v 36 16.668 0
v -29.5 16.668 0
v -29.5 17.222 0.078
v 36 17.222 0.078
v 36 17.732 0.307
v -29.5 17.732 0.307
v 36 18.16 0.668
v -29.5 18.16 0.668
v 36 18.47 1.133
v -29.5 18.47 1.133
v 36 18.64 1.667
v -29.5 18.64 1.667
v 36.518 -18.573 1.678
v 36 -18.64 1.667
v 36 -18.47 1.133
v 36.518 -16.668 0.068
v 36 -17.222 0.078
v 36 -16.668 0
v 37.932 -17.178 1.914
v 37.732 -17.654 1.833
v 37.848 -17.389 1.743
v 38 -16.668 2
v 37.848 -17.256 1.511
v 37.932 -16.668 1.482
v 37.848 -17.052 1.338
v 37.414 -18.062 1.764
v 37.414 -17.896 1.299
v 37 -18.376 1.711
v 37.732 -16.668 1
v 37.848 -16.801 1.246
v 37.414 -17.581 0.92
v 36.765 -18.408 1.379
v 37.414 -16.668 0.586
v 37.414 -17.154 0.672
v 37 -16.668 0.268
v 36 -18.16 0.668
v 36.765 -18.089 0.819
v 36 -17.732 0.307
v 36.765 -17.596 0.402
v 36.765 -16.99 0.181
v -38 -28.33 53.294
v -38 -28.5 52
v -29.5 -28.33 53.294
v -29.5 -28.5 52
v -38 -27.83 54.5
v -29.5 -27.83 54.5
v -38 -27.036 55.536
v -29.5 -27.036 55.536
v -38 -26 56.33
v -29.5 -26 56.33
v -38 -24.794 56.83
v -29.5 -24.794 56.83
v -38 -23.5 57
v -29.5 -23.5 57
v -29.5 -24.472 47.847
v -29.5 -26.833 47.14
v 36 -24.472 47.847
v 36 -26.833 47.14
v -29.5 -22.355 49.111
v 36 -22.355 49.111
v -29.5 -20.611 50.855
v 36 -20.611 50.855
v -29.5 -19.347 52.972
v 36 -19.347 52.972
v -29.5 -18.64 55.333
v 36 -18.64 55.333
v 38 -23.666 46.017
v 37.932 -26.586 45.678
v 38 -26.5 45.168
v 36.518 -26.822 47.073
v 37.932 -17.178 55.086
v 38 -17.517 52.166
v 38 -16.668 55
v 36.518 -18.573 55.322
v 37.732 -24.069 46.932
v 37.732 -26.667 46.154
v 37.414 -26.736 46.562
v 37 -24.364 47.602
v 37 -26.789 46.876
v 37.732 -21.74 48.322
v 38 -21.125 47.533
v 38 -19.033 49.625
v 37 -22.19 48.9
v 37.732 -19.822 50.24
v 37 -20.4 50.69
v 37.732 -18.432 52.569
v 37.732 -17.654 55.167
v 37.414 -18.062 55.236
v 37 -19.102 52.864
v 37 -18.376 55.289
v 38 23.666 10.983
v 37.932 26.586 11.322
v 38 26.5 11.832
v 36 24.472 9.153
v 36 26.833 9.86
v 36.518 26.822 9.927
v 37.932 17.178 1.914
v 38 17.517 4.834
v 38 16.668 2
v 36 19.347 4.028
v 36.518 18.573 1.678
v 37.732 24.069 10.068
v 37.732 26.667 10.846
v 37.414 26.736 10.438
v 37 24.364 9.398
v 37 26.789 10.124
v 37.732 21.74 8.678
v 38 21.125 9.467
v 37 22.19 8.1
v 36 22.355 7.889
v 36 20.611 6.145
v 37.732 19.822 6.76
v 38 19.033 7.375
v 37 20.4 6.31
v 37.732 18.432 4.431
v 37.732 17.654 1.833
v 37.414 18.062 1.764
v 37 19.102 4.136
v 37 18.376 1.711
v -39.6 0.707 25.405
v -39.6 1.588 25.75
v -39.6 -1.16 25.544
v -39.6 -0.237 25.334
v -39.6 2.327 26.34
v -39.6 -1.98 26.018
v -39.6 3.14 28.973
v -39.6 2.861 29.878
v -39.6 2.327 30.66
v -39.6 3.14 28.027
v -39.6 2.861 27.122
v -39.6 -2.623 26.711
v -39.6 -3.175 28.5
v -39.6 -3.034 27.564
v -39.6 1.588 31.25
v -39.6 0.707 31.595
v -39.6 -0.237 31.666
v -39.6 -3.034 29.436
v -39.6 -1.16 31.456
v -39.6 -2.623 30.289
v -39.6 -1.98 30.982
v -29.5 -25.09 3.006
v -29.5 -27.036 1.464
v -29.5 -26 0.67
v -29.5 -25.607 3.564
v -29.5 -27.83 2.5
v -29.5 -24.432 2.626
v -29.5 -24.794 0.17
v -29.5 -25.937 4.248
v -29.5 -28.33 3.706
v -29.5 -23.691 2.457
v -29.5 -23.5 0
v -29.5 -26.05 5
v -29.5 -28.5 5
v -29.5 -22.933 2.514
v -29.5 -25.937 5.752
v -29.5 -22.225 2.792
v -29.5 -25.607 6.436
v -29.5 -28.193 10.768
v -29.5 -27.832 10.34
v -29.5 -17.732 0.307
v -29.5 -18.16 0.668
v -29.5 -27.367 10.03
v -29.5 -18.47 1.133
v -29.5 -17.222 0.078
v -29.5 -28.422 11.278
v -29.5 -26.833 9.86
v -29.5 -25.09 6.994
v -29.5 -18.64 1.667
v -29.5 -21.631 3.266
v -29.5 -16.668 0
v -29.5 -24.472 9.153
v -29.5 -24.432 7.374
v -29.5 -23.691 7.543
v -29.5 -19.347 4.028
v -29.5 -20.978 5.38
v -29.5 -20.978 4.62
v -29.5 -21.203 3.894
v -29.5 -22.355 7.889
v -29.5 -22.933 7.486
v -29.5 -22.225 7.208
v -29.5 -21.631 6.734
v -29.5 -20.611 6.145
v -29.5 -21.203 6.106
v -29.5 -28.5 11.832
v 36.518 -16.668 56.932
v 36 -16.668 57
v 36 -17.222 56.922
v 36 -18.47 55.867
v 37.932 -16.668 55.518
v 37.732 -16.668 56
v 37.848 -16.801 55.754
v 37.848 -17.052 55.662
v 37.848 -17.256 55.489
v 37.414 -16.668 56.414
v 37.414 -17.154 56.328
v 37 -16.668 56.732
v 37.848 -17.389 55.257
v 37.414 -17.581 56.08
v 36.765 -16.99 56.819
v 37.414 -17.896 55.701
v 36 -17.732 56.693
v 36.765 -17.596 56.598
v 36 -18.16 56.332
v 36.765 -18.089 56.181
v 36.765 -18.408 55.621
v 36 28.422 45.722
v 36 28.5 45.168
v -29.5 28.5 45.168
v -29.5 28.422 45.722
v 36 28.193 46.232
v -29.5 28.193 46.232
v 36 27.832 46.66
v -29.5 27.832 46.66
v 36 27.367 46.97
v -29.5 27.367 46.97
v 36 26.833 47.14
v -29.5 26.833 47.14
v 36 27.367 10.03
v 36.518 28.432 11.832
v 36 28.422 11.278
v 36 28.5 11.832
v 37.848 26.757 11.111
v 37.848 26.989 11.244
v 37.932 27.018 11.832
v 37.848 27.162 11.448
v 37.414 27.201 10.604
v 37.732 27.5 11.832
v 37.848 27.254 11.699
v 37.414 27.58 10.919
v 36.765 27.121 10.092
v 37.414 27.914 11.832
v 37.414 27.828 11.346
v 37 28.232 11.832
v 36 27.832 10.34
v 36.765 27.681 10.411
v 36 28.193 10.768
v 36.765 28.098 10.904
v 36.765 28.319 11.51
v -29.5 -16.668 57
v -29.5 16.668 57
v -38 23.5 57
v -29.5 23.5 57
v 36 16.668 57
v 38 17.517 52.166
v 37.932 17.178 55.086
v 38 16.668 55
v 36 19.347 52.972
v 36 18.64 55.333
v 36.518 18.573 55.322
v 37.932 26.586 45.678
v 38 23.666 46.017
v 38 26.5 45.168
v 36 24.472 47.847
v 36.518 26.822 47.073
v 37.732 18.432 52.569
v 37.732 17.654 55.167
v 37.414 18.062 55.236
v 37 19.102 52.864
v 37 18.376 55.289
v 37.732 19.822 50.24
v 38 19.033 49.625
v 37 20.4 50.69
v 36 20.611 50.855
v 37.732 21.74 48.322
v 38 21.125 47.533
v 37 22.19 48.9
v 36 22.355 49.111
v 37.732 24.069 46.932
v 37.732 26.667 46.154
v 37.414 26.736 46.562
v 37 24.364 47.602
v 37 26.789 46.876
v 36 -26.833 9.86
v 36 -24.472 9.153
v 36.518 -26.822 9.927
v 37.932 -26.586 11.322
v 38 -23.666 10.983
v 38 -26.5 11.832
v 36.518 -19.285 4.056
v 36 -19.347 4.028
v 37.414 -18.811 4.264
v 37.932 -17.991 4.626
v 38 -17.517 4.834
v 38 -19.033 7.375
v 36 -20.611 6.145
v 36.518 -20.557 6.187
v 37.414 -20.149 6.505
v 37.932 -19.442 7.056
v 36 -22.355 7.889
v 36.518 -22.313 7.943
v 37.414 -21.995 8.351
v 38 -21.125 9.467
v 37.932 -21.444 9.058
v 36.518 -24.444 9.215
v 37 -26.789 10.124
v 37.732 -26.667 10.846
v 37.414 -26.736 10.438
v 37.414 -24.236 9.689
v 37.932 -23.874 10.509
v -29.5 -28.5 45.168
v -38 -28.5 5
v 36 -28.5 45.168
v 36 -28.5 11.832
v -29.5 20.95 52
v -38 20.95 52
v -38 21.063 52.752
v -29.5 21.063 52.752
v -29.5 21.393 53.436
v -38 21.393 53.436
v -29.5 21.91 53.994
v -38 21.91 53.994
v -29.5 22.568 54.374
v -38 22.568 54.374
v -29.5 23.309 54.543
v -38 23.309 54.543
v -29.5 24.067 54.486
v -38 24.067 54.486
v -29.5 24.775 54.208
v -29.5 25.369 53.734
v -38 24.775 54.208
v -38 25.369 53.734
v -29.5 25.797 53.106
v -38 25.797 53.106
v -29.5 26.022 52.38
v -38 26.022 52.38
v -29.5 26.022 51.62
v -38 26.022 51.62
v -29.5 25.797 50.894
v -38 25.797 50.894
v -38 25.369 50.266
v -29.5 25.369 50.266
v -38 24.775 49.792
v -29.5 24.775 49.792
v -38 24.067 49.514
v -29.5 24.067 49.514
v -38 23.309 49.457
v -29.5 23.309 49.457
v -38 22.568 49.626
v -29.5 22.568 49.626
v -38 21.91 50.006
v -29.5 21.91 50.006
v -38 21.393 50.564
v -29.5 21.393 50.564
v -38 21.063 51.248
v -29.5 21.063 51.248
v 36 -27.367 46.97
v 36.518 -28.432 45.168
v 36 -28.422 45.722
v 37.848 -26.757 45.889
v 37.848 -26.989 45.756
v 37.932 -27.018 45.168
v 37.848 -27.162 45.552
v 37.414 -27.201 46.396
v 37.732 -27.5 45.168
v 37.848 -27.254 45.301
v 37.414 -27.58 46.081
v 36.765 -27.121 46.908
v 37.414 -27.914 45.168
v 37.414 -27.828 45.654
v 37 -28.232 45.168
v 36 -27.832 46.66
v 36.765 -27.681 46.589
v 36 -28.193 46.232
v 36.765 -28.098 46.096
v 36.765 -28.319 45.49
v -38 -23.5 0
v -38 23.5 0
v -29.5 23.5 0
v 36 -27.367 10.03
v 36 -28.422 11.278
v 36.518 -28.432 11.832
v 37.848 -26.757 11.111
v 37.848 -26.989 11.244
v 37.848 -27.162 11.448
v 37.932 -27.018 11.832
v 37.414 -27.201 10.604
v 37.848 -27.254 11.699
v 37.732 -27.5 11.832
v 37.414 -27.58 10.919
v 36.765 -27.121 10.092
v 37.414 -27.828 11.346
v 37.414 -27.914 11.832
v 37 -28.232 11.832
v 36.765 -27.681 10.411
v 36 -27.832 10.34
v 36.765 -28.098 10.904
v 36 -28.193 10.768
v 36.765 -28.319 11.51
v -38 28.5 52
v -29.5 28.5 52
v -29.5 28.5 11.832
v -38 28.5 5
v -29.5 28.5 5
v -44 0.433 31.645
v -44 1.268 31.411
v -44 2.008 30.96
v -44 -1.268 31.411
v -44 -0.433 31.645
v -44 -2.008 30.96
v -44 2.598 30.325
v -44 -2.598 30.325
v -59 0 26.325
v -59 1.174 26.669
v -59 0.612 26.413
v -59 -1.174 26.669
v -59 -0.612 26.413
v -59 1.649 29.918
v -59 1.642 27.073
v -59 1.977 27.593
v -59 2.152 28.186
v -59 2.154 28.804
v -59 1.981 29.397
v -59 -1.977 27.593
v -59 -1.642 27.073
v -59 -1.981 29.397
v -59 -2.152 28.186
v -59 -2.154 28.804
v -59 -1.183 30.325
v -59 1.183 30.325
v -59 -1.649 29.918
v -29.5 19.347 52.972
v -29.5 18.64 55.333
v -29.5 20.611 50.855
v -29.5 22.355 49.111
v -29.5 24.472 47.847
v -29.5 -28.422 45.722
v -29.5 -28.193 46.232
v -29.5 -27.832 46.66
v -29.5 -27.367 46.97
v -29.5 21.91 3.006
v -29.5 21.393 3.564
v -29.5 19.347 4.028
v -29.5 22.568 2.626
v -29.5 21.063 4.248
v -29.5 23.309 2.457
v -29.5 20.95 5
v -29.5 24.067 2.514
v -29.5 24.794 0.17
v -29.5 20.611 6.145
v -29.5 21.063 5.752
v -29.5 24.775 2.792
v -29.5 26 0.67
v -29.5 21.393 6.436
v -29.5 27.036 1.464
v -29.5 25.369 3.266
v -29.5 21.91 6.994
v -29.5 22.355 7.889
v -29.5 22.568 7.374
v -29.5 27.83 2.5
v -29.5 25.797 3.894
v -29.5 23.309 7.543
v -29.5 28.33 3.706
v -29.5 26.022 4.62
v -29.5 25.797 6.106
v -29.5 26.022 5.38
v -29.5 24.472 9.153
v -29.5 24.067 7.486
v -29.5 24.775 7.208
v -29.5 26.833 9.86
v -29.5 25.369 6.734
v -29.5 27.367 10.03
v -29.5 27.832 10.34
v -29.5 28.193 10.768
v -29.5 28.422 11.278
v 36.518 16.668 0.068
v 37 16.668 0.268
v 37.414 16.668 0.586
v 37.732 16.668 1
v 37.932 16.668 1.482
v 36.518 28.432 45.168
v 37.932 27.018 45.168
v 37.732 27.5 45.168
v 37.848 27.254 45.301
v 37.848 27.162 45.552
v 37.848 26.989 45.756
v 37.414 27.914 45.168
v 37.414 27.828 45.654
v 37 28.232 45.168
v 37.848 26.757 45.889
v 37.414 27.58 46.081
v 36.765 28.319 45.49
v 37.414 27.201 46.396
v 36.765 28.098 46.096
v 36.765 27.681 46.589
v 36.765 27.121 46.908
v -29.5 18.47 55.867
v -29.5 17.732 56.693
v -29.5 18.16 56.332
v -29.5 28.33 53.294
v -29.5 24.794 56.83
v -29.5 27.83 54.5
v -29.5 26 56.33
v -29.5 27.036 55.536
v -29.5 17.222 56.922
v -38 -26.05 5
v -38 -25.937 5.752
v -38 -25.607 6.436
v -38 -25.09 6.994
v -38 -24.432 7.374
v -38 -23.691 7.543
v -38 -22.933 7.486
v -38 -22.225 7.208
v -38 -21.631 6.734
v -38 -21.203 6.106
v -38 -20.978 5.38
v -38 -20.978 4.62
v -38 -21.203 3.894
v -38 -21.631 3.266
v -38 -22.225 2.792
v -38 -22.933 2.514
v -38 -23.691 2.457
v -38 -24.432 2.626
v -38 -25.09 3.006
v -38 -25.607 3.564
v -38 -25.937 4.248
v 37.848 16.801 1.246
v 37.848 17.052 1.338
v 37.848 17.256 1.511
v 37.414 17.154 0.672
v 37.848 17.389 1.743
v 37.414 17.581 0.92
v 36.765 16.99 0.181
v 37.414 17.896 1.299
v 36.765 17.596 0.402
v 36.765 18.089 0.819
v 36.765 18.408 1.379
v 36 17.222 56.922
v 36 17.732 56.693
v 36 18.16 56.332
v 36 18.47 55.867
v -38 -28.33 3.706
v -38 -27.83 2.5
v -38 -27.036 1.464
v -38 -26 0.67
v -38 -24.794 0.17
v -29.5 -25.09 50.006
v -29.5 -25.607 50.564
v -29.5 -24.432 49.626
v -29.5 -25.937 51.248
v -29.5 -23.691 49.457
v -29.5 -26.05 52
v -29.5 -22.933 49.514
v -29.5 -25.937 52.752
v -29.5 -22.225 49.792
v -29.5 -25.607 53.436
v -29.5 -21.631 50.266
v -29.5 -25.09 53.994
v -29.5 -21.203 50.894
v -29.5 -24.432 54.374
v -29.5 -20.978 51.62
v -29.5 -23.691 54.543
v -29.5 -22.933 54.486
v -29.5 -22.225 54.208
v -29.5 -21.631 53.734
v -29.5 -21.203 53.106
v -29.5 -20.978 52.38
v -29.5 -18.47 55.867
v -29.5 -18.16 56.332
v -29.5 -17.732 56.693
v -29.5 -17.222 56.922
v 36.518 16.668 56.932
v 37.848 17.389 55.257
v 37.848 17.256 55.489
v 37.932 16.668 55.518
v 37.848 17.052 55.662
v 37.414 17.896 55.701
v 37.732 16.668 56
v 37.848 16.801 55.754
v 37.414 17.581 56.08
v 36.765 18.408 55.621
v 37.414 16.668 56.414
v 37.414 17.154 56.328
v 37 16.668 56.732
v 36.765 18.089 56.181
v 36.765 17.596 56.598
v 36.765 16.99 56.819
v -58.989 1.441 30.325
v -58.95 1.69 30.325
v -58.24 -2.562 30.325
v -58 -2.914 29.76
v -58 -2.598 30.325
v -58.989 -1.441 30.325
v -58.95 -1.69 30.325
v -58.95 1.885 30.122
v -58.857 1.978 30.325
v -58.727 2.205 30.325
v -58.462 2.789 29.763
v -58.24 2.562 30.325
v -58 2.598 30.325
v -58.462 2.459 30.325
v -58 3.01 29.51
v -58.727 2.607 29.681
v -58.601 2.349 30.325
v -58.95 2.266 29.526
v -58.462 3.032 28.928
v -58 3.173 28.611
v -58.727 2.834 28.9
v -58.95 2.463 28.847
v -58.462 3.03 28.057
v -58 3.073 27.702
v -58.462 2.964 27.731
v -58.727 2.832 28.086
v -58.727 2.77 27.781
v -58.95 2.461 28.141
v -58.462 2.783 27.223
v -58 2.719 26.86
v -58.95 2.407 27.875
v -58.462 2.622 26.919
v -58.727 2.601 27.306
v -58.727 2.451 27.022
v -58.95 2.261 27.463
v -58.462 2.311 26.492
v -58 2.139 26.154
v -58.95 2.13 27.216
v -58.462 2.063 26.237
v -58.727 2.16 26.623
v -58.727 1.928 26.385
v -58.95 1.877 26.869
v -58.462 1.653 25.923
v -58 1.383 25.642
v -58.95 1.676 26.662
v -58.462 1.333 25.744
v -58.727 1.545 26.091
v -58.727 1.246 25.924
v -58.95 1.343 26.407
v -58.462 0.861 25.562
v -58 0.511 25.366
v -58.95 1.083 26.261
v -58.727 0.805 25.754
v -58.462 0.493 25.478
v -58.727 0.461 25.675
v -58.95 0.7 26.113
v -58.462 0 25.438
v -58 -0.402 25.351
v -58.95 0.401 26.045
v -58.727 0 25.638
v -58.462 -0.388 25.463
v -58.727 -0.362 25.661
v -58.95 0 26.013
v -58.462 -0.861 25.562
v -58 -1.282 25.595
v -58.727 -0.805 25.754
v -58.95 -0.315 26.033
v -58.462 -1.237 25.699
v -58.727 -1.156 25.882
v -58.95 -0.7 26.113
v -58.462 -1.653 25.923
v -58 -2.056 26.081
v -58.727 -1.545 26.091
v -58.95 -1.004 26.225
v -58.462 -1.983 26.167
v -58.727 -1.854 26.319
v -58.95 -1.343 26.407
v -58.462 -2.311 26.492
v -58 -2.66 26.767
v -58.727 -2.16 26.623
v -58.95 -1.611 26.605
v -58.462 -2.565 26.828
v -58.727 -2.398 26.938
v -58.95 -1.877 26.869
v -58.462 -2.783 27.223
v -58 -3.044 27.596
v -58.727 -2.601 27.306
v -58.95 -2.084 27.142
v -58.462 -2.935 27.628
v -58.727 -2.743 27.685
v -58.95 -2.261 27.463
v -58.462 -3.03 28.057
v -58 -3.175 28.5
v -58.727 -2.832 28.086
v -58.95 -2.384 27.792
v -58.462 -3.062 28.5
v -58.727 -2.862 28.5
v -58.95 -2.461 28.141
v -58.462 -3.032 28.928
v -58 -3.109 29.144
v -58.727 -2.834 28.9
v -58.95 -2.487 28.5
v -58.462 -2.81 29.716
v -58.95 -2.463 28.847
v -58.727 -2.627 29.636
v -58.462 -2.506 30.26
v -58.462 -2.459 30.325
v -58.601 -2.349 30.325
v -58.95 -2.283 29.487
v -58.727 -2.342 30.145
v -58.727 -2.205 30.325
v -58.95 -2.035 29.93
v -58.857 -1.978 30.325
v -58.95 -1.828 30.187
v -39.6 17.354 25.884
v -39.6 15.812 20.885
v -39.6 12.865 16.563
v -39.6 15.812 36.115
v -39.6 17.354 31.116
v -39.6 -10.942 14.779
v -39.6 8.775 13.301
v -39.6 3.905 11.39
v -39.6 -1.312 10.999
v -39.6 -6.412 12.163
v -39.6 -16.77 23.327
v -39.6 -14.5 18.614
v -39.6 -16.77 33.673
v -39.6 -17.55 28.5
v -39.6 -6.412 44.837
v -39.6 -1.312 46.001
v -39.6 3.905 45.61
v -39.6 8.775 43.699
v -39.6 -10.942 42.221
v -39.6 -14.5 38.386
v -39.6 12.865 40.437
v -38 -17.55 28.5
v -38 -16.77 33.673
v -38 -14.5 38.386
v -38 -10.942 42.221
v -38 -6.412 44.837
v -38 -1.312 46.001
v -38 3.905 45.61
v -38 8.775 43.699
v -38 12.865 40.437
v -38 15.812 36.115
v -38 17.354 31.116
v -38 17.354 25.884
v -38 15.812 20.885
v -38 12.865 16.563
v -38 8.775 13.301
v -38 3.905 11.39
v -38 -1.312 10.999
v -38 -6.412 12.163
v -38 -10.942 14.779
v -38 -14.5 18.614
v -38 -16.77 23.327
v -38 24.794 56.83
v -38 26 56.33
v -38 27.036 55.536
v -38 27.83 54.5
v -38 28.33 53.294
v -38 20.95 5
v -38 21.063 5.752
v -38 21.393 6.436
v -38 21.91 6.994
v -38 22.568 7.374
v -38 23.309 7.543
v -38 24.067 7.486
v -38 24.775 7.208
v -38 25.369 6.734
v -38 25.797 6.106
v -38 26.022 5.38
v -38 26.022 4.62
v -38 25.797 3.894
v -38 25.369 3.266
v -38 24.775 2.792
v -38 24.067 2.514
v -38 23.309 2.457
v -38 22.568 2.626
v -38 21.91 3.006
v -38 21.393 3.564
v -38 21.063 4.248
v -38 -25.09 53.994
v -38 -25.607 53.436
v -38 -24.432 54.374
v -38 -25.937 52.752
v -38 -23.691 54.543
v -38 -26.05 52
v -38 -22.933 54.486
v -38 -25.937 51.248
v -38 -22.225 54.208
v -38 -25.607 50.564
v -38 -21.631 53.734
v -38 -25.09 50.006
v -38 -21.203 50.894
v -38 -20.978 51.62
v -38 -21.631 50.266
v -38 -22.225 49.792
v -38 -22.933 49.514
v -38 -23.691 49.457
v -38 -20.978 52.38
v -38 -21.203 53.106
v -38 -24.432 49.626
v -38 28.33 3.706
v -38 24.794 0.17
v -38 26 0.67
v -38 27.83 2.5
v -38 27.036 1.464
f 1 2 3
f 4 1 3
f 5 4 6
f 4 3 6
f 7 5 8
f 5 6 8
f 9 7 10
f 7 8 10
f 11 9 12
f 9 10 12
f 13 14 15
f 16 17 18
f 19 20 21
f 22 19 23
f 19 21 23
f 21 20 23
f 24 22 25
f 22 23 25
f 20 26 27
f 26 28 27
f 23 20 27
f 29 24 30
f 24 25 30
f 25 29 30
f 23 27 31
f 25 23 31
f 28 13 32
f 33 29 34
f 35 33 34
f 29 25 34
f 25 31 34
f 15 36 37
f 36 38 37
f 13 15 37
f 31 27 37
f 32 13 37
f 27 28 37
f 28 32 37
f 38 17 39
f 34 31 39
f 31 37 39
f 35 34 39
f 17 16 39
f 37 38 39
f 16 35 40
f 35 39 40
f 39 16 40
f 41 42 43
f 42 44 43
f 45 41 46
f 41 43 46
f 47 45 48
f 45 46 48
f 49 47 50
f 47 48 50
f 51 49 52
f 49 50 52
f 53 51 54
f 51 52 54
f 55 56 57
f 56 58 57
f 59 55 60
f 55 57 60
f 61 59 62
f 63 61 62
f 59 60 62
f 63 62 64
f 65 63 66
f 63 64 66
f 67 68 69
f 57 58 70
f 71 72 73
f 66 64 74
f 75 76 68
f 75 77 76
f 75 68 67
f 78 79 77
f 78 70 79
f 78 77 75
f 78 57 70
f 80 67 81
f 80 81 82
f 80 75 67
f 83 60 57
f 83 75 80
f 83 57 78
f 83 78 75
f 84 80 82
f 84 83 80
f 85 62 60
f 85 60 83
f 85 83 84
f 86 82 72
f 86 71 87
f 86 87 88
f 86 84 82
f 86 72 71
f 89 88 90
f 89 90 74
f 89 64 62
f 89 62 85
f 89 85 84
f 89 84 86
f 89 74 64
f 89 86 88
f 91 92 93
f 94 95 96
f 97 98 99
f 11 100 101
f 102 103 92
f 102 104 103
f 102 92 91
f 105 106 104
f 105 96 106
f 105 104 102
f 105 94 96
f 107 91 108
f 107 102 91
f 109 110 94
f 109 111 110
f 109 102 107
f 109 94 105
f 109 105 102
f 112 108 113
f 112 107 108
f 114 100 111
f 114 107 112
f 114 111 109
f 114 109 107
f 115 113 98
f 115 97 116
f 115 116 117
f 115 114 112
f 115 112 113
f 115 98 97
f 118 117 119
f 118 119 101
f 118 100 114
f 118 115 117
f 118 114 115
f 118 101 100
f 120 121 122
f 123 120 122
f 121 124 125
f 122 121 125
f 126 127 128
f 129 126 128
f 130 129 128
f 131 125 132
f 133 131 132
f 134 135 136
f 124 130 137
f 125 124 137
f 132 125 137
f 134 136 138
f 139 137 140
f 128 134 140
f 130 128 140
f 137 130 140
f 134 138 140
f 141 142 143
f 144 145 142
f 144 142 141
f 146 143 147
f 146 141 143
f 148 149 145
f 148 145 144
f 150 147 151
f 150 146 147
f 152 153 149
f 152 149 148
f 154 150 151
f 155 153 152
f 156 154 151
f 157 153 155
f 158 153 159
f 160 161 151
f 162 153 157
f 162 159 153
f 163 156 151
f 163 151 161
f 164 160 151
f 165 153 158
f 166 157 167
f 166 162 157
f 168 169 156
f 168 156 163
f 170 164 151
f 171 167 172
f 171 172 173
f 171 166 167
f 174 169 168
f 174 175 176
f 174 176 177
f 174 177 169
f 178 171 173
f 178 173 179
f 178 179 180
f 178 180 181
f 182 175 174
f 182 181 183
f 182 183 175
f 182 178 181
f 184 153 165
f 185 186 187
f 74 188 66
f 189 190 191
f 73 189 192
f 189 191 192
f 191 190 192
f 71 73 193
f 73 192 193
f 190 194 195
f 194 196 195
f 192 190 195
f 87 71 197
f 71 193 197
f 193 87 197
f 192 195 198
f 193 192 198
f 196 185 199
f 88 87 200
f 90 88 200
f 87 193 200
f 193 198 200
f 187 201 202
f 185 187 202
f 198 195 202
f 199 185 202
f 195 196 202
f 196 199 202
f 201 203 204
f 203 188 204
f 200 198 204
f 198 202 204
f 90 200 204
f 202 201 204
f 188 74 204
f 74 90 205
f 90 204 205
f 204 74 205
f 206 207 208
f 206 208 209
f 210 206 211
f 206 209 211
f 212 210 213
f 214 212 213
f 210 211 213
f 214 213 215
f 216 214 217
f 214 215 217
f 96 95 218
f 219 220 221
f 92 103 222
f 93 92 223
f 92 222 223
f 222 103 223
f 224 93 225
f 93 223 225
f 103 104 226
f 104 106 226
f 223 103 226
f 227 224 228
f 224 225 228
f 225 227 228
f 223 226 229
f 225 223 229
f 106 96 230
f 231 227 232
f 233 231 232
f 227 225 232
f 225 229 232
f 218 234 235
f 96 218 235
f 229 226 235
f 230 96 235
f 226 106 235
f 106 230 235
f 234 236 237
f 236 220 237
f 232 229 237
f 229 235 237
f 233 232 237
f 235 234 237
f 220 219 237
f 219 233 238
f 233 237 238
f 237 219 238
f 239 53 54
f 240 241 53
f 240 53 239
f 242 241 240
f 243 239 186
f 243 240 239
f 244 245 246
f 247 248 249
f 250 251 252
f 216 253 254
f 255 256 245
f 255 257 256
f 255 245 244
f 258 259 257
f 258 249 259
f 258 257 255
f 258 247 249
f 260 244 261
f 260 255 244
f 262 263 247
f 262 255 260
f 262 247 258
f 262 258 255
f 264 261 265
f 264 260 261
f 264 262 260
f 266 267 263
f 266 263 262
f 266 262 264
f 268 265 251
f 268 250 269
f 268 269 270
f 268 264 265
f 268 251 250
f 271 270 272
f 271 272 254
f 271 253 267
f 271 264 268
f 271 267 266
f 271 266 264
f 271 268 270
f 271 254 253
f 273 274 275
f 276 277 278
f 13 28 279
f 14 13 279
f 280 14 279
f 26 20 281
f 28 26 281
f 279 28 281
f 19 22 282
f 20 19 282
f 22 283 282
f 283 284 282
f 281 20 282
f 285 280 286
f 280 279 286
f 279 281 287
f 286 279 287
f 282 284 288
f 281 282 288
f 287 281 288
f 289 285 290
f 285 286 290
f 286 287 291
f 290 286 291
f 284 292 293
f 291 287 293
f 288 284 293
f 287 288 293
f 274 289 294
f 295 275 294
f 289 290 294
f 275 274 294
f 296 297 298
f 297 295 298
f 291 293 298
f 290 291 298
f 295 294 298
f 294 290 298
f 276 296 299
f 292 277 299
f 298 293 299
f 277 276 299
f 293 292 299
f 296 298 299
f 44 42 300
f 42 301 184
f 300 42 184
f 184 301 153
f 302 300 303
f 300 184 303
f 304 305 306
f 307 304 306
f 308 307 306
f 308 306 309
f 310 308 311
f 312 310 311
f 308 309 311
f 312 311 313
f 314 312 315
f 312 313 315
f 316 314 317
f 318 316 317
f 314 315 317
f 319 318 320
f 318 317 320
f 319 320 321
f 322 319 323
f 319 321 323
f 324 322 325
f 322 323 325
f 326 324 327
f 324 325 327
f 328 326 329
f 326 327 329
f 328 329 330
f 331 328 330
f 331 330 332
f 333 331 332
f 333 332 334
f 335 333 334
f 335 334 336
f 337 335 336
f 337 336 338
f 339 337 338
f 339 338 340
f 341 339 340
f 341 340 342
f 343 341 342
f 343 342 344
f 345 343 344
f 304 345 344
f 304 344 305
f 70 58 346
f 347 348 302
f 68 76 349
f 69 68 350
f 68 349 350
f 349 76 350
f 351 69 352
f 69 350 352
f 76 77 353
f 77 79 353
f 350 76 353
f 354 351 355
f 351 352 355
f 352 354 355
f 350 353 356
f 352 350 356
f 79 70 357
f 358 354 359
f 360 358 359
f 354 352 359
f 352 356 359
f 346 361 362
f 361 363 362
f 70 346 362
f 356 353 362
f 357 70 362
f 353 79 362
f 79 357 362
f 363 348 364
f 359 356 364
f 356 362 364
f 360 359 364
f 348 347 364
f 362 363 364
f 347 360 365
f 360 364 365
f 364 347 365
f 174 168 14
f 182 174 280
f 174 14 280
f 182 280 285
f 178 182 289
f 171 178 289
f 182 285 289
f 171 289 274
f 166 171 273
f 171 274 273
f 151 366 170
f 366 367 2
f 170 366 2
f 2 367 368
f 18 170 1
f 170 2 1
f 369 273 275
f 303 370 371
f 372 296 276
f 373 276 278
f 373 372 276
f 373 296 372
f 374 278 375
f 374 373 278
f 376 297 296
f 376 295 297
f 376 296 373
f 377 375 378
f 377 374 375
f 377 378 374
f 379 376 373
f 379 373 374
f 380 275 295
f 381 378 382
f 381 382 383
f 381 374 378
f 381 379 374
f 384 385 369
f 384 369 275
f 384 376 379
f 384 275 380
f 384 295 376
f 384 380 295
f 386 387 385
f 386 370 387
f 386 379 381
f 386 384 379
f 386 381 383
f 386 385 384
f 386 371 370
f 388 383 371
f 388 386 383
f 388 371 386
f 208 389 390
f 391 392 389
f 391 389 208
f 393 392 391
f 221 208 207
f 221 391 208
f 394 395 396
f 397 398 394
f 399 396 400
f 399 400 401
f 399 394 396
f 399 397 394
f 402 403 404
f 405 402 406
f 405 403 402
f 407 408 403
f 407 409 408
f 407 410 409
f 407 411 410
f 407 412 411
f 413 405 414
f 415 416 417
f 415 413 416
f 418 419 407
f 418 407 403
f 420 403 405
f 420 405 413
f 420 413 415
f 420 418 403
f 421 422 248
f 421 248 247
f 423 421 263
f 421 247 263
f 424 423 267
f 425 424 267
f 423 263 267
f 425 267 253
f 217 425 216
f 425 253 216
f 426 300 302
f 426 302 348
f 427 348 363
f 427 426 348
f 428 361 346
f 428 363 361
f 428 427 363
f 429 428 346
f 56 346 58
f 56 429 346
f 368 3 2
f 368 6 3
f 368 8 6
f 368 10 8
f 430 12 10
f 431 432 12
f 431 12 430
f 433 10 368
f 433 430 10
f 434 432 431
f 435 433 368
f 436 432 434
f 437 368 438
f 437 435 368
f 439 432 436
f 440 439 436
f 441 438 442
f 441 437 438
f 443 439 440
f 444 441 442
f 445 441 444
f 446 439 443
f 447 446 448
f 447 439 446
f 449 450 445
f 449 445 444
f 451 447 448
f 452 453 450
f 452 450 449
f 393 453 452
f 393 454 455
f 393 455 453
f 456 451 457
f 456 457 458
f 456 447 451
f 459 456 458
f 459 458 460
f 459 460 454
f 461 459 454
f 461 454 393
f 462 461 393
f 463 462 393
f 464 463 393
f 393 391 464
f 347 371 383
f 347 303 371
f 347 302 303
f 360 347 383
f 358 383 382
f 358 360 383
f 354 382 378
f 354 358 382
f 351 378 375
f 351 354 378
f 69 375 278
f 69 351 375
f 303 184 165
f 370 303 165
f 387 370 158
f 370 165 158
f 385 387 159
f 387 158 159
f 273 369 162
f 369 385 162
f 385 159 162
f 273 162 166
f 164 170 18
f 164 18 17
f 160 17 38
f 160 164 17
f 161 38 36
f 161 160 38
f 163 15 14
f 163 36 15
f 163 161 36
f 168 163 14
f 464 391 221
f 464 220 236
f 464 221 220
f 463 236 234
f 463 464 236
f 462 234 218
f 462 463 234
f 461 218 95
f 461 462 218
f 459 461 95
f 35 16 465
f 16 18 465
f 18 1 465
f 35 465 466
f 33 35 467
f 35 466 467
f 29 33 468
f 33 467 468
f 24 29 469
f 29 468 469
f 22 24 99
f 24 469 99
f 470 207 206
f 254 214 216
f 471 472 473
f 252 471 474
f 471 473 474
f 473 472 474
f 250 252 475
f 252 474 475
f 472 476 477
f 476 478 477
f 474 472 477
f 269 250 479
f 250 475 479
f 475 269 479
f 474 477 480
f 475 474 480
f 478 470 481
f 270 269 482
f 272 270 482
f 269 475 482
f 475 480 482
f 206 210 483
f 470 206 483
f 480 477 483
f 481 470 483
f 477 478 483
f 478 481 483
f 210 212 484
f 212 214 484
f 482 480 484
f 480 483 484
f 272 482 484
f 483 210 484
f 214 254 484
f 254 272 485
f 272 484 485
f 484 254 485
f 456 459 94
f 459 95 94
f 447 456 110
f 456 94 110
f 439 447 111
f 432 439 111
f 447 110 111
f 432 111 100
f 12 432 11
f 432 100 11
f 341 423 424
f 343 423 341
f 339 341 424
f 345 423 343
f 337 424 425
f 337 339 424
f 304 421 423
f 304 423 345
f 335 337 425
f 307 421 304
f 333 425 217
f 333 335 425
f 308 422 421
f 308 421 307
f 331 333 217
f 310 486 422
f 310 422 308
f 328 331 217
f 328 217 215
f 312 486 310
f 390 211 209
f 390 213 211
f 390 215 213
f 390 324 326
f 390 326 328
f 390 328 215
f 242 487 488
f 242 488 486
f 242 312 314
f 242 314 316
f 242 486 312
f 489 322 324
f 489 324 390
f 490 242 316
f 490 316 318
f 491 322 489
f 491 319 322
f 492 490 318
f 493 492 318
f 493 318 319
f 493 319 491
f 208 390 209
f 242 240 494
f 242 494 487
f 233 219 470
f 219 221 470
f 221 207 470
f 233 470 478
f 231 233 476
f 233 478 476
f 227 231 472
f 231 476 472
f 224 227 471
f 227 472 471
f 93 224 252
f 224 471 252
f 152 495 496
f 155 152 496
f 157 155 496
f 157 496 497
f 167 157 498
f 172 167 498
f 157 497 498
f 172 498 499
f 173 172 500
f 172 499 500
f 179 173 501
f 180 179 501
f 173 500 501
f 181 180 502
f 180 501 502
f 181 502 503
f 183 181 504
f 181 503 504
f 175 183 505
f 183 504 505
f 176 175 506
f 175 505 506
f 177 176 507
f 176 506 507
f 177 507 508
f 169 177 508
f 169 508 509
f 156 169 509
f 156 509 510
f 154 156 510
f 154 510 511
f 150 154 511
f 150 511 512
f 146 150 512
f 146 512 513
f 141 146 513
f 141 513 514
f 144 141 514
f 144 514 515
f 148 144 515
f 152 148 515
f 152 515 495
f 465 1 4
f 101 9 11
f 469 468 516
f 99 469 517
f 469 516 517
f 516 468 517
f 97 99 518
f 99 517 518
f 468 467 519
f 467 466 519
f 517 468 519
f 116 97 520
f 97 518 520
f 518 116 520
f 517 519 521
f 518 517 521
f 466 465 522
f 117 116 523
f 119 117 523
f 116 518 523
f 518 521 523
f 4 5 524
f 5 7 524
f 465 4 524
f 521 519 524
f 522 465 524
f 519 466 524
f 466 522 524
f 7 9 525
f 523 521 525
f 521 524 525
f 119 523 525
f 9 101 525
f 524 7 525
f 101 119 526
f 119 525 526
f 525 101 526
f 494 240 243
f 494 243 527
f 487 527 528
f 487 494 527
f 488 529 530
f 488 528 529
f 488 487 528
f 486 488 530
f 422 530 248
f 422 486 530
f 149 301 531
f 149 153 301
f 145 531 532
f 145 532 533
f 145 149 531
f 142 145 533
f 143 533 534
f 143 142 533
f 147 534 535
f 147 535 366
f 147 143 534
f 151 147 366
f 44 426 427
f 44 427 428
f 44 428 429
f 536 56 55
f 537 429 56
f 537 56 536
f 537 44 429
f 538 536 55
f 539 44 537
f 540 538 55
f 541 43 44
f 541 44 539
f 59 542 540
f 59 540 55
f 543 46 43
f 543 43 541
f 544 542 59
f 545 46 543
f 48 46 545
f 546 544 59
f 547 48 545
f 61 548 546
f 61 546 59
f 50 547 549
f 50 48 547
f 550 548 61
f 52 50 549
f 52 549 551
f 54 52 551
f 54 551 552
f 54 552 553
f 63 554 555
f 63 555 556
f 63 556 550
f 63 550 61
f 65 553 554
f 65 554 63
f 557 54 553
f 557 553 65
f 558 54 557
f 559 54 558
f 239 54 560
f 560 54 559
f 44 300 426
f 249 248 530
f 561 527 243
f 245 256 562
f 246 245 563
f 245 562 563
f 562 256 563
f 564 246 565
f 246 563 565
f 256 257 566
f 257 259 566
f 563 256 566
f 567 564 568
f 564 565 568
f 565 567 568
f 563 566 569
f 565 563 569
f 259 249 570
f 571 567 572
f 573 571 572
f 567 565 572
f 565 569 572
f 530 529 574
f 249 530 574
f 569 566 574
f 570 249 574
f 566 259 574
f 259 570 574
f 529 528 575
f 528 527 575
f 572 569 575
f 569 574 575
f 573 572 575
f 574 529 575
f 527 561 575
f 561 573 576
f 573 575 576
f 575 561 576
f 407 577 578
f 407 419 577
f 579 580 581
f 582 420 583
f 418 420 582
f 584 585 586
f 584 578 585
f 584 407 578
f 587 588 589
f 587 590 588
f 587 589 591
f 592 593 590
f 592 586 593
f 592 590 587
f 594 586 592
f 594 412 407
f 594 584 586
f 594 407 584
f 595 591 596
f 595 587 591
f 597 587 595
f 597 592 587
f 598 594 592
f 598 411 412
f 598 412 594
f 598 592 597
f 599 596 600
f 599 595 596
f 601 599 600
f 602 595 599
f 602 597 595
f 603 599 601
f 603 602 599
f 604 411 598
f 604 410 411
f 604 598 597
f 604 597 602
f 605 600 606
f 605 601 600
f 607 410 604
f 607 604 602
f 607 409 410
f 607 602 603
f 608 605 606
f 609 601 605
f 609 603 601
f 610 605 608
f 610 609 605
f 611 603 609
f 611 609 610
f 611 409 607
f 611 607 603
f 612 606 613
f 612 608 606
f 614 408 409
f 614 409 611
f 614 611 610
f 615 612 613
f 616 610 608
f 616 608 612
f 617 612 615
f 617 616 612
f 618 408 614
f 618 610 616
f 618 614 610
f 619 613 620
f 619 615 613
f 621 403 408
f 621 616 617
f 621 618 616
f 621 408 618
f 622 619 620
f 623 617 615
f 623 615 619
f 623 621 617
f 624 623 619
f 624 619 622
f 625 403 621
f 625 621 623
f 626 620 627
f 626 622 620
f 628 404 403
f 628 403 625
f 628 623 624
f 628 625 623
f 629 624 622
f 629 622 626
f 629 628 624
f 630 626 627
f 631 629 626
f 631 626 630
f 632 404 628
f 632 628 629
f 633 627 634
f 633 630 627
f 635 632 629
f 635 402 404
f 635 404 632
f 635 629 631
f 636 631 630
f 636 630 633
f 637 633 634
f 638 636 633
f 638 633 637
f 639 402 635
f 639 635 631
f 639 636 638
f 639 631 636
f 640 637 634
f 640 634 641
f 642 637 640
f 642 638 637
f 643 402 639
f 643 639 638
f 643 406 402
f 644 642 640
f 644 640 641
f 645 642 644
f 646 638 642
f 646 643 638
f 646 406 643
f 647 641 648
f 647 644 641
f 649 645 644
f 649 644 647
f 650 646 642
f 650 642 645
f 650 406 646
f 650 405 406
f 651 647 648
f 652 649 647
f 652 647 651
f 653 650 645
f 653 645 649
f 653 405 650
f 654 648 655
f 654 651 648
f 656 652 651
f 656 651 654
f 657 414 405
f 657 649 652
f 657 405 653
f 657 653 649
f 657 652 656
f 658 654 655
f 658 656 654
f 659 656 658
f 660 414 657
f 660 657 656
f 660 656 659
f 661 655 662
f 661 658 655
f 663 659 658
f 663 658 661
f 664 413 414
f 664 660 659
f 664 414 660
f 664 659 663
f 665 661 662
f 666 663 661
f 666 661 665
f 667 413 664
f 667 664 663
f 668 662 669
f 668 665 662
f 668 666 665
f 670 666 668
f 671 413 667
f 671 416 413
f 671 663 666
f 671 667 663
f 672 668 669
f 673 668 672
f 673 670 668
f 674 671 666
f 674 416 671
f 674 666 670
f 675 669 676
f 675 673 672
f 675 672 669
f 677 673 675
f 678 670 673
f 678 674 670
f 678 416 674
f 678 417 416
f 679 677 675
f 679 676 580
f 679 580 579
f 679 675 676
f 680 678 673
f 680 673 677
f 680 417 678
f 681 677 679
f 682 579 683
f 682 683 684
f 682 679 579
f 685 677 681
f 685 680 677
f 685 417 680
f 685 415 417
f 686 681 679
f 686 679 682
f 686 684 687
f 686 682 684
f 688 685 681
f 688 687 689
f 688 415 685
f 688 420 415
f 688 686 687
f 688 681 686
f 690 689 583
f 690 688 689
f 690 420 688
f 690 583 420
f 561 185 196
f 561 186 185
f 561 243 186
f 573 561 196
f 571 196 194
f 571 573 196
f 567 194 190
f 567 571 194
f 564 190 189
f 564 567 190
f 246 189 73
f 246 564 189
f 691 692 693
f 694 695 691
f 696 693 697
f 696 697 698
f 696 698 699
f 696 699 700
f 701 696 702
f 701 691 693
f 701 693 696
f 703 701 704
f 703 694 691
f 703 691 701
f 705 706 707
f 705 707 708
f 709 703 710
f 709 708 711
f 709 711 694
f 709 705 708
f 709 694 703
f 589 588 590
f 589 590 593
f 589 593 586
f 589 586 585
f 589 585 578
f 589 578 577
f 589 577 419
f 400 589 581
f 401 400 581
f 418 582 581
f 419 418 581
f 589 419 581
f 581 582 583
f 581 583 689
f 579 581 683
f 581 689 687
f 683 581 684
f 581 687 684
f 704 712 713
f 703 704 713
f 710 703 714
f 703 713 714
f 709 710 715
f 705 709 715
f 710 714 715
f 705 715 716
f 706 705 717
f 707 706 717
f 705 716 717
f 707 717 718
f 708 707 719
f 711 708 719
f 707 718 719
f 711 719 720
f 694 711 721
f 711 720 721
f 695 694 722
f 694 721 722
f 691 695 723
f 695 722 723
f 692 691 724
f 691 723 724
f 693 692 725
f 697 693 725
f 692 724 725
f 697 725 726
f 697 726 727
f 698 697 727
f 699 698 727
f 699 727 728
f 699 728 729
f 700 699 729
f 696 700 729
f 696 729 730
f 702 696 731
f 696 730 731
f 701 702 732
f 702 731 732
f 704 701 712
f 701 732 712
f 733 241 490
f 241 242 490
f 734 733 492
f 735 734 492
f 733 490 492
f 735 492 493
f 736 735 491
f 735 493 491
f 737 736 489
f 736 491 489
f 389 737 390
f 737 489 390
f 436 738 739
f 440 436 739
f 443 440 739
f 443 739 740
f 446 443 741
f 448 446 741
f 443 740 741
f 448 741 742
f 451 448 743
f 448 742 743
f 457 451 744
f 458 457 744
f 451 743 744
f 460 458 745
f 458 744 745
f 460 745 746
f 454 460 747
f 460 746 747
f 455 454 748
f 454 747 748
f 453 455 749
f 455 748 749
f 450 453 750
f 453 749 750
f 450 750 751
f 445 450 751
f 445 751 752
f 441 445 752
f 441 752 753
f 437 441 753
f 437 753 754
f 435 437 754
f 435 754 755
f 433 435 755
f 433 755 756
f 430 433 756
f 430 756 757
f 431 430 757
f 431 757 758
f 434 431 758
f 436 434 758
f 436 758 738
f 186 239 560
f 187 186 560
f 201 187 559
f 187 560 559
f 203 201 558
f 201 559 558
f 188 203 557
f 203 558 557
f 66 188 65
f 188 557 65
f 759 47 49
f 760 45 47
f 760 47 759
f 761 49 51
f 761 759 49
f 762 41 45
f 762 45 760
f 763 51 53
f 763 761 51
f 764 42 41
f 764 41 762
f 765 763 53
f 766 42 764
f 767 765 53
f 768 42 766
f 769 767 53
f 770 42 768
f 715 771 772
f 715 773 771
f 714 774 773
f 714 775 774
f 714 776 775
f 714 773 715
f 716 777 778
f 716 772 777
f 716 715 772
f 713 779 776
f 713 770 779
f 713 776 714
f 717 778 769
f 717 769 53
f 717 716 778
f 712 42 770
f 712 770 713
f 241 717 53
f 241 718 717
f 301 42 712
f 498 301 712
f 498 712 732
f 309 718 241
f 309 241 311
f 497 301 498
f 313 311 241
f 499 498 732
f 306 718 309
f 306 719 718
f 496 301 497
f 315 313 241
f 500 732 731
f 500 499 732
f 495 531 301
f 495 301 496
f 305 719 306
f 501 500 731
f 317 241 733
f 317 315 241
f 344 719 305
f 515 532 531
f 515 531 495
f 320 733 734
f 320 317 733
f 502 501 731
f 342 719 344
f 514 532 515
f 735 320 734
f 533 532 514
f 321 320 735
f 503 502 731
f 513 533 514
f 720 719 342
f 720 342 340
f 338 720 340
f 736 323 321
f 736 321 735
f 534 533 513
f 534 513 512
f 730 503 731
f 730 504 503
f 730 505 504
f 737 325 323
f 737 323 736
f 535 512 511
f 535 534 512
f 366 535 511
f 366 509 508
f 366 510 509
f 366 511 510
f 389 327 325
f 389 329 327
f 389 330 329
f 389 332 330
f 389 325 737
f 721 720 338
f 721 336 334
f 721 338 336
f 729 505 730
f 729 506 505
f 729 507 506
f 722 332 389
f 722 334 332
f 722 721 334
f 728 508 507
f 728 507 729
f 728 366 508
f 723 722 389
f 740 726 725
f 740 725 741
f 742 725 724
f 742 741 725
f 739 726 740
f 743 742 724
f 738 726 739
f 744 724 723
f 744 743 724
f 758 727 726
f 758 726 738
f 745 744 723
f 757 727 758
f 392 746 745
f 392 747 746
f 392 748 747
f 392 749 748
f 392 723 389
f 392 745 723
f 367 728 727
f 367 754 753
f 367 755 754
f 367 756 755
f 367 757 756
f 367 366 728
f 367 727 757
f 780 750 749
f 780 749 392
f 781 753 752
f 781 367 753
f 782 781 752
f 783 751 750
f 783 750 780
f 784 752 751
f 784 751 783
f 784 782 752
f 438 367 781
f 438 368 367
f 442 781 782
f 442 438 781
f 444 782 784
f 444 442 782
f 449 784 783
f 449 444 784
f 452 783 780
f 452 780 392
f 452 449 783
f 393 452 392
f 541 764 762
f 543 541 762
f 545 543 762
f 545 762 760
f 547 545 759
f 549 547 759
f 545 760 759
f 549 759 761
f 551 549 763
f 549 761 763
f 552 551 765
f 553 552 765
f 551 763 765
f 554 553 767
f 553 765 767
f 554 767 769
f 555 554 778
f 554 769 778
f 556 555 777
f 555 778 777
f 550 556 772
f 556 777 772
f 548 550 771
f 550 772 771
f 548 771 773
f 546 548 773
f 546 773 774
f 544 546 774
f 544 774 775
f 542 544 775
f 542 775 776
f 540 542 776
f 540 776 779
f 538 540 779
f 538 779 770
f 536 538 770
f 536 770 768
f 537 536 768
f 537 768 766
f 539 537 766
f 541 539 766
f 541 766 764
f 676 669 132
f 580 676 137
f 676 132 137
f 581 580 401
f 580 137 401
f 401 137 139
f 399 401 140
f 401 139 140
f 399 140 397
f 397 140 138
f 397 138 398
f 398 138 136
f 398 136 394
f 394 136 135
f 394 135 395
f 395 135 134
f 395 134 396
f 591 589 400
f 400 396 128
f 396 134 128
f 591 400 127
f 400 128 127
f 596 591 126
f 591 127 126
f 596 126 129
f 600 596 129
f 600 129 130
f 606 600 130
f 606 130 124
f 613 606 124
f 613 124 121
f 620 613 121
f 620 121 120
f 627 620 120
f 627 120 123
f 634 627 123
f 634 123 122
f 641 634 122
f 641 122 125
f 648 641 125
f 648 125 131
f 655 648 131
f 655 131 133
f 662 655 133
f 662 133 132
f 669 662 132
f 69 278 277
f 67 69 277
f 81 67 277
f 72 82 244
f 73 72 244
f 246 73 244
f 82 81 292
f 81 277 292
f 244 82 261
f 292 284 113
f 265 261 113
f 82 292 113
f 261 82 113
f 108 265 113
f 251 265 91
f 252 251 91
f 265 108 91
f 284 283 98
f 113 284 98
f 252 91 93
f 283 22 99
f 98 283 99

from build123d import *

# Parameters (mm, degrees)
F0_W      = 76
F0_H      = 57
F1_DEPTH  = 57
F2_R      = 17.55
F3_DEPTH  = 1.6
F4_R      = 2.55
F5_DEPTH  = 25
F7_DEPTH  = 67.5
F8_R      = 5
F9_R      = 2
F10_R     = 3.175
F11_DEPTH = 19.4
F13_DEPTH = 15
F14_R     = 1


with BuildPart() as f1:
    # F0 (on Top) → F1 (new body)
    with BuildSketch(Plane.XY):
        Rectangle(F0_W, F0_H)
    extrude(amount=F1_DEPTH)

    # F2 (on face) → F3 (join)
    with BuildSketch(Plane(origin=(-38, 0, 0), x_dir=(0, -1, 0), z_dir=(-1, 0, 0))):
        with Locations((0, 28.5)):
            Circle(F2_R)
    extrude(amount=F3_DEPTH)

    # F4 (on face) → F5 (cut)
    with BuildSketch(Plane(origin=(-38, 0, 0), x_dir=(0, -1, 0), z_dir=(-1, 0, 0))):
        with Locations((-23.5, 52)):
            Circle(F4_R)
        with Locations((23.5, 52)):
            Circle(F4_R)
        with Locations((23.5, 5)):
            Circle(F4_R)
        with Locations((-23.5, 5)):
            Circle(F4_R)
    extrude(amount=-F5_DEPTH, mode=Mode.SUBTRACT)

    # F6 (on face) → F7 (cut)
    with BuildSketch(Plane.YZ.offset(38)):
        with BuildLine():
            Line((-28.5, 57), (-28.5, 47))
            ThreePointArc((-28.5, 47), (-21.4289321881, 49.9289321881), (-18.5, 57))
            Line((-18.5, 57), (-28.5, 57))
        make_face()
        with BuildLine():
            Line((-28.5, 0), (-18.5, 0))
            ThreePointArc((-18.5, 0), (-21.4289321881, 7.0710678119), (-28.5, 10))
            Line((-28.5, 10), (-28.5, 0))
        make_face()
        with BuildLine():
            Line((28.5, 0), (28.5, 10))
            ThreePointArc((28.5, 10), (21.4289321881, 7.0710678119), (18.5, 0))
            Line((18.5, 0), (28.5, 0))
        make_face()
        with BuildLine():
            Line((28.5, 57), (18.5, 57))
            ThreePointArc((18.5, 57), (21.4289321881, 49.9289321881), (28.5, 47))
            Line((28.5, 47), (28.5, 57))
        make_face()
    extrude(amount=-F7_DEPTH, mode=Mode.SUBTRACT)

    # F8
    f8_edges = [f1.edges().sort_by_distance(p)[0] for p in [
        (-33.75, -28.5, 57),
        (-33.75, 28.5, 57),
        (-33.75, 28.5, 0),
        (-33.75, -28.5, 0),
    ]]
    fillet(f8_edges, radius=F8_R)

    # F9
    f9_edges = [f1.edges().sort_by_distance(p)[0] for p in [
        (4.25, -18.5, 57),
        (4.25, -28.5, 47),
        (4.25, -28.5, 10),
        (4.25, -18.5, 0),
        (4.25, 18.5, 57),
        (4.25, 28.5, 47),
        (4.25, 28.5, 10),
        (4.25, 18.5, 0),
        (38, -21.428932, 7.071068),
        (38, 0, 0),
        (38, 21.428932, 7.071068),
        (38, 28.5, 28.5),
        (38, 21.428932, 49.928932),
        (38, 0, 57),
        (38, -21.428932, 49.928932),
        (38, -28.5, 28.5),
    ]]
    fillet(f9_edges, radius=F9_R)


with BuildPart() as f11:
    # F10 (on face) → F11 (new body)
    with BuildSketch(Plane(origin=(-39.6, 0, 0), x_dir=(0, -1, 0), z_dir=(-1, 0, 0))):
        with Locations((0, 28.5)):
            Circle(F10_R)
    extrude(amount=F11_DEPTH)

    # F12 (on face) → F13 (cut)
    with BuildSketch(Plane(origin=(-59, 0, 0), x_dir=(0, -1, 0), z_dir=(-1, 0, 0))):
        with BuildLine():
            ThreePointArc((2.5980762114, 30.325), (0, 31.675), (-2.5980762114, 30.325))
            Line((-2.5980762114, 30.325), (2.5980762114, 30.325))
        make_face()
    extrude(amount=-F13_DEPTH, mode=Mode.SUBTRACT)

    # F14
    f14_edges = [f11.edges().sort_by_distance(p)[0] for p in [
        (-59, 0.957009, 25.472665),
    ]]
    fillet(f14_edges, radius=F14_R)


solid = Compound([f1.part, f11.part])
